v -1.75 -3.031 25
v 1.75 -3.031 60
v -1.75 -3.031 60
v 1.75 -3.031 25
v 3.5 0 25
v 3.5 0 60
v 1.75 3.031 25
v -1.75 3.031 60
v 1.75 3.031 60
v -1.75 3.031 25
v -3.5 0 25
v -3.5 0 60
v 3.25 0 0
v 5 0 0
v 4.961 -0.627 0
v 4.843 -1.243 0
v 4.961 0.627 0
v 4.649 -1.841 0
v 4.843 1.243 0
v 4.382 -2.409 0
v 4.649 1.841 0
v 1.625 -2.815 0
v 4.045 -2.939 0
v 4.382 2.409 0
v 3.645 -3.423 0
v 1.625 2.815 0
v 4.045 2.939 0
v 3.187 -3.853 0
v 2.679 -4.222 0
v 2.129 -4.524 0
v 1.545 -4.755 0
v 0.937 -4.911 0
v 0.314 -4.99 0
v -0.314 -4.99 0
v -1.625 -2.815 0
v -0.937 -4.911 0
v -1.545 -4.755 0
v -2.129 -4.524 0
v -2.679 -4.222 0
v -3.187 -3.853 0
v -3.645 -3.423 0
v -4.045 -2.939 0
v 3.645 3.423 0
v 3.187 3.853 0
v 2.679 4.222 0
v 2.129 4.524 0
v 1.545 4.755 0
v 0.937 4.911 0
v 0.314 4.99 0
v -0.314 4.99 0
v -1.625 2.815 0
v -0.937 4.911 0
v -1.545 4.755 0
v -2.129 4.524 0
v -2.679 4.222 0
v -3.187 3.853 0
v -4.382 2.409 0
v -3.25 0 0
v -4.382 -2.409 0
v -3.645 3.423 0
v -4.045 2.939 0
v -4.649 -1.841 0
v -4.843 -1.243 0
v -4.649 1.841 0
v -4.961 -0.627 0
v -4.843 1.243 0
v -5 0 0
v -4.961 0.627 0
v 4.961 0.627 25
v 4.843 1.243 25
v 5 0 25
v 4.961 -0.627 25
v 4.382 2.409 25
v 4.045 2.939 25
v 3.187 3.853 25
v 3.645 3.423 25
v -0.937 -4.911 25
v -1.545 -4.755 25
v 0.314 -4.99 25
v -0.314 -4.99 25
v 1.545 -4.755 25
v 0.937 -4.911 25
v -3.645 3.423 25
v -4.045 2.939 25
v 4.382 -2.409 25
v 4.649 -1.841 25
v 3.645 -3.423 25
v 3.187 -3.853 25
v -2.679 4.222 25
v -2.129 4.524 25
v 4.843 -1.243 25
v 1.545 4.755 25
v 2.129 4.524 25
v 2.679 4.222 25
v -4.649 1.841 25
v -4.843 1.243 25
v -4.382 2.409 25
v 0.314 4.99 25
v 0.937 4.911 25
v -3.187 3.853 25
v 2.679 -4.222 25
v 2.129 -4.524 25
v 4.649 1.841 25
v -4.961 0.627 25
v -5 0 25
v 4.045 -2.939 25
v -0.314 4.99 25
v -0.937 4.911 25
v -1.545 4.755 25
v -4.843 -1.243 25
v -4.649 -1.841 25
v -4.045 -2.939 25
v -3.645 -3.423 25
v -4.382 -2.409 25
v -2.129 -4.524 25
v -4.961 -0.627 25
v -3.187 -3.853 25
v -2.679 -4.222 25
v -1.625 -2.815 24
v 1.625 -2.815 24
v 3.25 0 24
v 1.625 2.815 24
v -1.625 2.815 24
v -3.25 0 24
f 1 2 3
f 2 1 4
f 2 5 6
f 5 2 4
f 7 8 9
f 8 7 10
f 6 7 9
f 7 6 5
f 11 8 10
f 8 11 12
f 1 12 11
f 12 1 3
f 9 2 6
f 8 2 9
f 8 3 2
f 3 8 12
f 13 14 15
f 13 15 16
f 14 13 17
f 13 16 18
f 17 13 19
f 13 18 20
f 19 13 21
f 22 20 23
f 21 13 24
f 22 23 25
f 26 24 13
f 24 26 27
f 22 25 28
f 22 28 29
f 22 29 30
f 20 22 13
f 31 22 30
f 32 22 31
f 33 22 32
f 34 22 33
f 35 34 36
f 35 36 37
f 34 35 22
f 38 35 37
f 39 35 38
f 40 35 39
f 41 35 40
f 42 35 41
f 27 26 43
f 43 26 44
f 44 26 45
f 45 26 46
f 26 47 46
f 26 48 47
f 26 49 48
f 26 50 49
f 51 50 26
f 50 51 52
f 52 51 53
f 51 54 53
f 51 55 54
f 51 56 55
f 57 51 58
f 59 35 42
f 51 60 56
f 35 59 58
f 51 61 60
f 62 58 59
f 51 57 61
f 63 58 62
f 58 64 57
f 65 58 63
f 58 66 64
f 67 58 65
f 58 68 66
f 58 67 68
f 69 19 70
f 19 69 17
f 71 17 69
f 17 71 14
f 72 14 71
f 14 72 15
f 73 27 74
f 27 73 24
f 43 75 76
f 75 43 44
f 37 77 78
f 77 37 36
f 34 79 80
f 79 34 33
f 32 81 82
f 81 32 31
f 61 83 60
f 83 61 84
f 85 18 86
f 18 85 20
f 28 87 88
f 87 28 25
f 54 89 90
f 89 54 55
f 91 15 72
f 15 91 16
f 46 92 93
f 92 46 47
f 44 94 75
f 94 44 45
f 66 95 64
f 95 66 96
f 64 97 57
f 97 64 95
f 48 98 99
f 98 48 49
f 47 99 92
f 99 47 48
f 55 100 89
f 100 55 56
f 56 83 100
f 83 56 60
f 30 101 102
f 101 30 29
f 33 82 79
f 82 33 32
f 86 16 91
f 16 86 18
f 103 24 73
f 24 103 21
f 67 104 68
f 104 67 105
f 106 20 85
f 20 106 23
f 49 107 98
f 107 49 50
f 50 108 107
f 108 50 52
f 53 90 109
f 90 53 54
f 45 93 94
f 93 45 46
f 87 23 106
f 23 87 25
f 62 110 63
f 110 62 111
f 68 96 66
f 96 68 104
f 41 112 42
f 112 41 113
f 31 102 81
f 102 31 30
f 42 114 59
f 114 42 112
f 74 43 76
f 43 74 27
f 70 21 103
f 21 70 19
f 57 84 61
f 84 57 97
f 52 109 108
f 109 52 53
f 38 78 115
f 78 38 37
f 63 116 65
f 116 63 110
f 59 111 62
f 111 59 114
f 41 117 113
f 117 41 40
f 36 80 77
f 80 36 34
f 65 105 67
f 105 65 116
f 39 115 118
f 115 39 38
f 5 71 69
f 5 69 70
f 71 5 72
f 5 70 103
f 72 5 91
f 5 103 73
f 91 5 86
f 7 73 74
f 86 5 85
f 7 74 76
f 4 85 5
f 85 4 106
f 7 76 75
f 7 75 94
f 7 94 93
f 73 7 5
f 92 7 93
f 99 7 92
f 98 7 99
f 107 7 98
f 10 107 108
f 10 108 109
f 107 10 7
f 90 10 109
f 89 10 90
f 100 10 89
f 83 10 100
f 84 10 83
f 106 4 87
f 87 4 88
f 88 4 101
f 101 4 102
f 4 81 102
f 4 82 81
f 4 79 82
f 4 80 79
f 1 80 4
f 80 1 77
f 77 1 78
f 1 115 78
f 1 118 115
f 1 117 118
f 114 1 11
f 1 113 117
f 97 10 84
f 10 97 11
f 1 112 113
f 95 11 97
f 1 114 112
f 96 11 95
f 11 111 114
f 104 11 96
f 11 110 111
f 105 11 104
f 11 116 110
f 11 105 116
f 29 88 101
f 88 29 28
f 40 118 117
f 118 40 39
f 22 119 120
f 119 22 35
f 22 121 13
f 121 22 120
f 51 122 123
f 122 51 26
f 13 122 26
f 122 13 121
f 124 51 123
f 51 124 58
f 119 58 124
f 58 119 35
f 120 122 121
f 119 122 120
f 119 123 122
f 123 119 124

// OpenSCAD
SOCKET_LEN=25;
difference(){
    union(){
        cylinder(d=7, h=60, $fn=6);
        cylinder(d=10, h=SOCKET_LEN, $fn=50);
    }
    cylinder(d=6.5, h=SOCKET_LEN - 1, $fn=6);
}
